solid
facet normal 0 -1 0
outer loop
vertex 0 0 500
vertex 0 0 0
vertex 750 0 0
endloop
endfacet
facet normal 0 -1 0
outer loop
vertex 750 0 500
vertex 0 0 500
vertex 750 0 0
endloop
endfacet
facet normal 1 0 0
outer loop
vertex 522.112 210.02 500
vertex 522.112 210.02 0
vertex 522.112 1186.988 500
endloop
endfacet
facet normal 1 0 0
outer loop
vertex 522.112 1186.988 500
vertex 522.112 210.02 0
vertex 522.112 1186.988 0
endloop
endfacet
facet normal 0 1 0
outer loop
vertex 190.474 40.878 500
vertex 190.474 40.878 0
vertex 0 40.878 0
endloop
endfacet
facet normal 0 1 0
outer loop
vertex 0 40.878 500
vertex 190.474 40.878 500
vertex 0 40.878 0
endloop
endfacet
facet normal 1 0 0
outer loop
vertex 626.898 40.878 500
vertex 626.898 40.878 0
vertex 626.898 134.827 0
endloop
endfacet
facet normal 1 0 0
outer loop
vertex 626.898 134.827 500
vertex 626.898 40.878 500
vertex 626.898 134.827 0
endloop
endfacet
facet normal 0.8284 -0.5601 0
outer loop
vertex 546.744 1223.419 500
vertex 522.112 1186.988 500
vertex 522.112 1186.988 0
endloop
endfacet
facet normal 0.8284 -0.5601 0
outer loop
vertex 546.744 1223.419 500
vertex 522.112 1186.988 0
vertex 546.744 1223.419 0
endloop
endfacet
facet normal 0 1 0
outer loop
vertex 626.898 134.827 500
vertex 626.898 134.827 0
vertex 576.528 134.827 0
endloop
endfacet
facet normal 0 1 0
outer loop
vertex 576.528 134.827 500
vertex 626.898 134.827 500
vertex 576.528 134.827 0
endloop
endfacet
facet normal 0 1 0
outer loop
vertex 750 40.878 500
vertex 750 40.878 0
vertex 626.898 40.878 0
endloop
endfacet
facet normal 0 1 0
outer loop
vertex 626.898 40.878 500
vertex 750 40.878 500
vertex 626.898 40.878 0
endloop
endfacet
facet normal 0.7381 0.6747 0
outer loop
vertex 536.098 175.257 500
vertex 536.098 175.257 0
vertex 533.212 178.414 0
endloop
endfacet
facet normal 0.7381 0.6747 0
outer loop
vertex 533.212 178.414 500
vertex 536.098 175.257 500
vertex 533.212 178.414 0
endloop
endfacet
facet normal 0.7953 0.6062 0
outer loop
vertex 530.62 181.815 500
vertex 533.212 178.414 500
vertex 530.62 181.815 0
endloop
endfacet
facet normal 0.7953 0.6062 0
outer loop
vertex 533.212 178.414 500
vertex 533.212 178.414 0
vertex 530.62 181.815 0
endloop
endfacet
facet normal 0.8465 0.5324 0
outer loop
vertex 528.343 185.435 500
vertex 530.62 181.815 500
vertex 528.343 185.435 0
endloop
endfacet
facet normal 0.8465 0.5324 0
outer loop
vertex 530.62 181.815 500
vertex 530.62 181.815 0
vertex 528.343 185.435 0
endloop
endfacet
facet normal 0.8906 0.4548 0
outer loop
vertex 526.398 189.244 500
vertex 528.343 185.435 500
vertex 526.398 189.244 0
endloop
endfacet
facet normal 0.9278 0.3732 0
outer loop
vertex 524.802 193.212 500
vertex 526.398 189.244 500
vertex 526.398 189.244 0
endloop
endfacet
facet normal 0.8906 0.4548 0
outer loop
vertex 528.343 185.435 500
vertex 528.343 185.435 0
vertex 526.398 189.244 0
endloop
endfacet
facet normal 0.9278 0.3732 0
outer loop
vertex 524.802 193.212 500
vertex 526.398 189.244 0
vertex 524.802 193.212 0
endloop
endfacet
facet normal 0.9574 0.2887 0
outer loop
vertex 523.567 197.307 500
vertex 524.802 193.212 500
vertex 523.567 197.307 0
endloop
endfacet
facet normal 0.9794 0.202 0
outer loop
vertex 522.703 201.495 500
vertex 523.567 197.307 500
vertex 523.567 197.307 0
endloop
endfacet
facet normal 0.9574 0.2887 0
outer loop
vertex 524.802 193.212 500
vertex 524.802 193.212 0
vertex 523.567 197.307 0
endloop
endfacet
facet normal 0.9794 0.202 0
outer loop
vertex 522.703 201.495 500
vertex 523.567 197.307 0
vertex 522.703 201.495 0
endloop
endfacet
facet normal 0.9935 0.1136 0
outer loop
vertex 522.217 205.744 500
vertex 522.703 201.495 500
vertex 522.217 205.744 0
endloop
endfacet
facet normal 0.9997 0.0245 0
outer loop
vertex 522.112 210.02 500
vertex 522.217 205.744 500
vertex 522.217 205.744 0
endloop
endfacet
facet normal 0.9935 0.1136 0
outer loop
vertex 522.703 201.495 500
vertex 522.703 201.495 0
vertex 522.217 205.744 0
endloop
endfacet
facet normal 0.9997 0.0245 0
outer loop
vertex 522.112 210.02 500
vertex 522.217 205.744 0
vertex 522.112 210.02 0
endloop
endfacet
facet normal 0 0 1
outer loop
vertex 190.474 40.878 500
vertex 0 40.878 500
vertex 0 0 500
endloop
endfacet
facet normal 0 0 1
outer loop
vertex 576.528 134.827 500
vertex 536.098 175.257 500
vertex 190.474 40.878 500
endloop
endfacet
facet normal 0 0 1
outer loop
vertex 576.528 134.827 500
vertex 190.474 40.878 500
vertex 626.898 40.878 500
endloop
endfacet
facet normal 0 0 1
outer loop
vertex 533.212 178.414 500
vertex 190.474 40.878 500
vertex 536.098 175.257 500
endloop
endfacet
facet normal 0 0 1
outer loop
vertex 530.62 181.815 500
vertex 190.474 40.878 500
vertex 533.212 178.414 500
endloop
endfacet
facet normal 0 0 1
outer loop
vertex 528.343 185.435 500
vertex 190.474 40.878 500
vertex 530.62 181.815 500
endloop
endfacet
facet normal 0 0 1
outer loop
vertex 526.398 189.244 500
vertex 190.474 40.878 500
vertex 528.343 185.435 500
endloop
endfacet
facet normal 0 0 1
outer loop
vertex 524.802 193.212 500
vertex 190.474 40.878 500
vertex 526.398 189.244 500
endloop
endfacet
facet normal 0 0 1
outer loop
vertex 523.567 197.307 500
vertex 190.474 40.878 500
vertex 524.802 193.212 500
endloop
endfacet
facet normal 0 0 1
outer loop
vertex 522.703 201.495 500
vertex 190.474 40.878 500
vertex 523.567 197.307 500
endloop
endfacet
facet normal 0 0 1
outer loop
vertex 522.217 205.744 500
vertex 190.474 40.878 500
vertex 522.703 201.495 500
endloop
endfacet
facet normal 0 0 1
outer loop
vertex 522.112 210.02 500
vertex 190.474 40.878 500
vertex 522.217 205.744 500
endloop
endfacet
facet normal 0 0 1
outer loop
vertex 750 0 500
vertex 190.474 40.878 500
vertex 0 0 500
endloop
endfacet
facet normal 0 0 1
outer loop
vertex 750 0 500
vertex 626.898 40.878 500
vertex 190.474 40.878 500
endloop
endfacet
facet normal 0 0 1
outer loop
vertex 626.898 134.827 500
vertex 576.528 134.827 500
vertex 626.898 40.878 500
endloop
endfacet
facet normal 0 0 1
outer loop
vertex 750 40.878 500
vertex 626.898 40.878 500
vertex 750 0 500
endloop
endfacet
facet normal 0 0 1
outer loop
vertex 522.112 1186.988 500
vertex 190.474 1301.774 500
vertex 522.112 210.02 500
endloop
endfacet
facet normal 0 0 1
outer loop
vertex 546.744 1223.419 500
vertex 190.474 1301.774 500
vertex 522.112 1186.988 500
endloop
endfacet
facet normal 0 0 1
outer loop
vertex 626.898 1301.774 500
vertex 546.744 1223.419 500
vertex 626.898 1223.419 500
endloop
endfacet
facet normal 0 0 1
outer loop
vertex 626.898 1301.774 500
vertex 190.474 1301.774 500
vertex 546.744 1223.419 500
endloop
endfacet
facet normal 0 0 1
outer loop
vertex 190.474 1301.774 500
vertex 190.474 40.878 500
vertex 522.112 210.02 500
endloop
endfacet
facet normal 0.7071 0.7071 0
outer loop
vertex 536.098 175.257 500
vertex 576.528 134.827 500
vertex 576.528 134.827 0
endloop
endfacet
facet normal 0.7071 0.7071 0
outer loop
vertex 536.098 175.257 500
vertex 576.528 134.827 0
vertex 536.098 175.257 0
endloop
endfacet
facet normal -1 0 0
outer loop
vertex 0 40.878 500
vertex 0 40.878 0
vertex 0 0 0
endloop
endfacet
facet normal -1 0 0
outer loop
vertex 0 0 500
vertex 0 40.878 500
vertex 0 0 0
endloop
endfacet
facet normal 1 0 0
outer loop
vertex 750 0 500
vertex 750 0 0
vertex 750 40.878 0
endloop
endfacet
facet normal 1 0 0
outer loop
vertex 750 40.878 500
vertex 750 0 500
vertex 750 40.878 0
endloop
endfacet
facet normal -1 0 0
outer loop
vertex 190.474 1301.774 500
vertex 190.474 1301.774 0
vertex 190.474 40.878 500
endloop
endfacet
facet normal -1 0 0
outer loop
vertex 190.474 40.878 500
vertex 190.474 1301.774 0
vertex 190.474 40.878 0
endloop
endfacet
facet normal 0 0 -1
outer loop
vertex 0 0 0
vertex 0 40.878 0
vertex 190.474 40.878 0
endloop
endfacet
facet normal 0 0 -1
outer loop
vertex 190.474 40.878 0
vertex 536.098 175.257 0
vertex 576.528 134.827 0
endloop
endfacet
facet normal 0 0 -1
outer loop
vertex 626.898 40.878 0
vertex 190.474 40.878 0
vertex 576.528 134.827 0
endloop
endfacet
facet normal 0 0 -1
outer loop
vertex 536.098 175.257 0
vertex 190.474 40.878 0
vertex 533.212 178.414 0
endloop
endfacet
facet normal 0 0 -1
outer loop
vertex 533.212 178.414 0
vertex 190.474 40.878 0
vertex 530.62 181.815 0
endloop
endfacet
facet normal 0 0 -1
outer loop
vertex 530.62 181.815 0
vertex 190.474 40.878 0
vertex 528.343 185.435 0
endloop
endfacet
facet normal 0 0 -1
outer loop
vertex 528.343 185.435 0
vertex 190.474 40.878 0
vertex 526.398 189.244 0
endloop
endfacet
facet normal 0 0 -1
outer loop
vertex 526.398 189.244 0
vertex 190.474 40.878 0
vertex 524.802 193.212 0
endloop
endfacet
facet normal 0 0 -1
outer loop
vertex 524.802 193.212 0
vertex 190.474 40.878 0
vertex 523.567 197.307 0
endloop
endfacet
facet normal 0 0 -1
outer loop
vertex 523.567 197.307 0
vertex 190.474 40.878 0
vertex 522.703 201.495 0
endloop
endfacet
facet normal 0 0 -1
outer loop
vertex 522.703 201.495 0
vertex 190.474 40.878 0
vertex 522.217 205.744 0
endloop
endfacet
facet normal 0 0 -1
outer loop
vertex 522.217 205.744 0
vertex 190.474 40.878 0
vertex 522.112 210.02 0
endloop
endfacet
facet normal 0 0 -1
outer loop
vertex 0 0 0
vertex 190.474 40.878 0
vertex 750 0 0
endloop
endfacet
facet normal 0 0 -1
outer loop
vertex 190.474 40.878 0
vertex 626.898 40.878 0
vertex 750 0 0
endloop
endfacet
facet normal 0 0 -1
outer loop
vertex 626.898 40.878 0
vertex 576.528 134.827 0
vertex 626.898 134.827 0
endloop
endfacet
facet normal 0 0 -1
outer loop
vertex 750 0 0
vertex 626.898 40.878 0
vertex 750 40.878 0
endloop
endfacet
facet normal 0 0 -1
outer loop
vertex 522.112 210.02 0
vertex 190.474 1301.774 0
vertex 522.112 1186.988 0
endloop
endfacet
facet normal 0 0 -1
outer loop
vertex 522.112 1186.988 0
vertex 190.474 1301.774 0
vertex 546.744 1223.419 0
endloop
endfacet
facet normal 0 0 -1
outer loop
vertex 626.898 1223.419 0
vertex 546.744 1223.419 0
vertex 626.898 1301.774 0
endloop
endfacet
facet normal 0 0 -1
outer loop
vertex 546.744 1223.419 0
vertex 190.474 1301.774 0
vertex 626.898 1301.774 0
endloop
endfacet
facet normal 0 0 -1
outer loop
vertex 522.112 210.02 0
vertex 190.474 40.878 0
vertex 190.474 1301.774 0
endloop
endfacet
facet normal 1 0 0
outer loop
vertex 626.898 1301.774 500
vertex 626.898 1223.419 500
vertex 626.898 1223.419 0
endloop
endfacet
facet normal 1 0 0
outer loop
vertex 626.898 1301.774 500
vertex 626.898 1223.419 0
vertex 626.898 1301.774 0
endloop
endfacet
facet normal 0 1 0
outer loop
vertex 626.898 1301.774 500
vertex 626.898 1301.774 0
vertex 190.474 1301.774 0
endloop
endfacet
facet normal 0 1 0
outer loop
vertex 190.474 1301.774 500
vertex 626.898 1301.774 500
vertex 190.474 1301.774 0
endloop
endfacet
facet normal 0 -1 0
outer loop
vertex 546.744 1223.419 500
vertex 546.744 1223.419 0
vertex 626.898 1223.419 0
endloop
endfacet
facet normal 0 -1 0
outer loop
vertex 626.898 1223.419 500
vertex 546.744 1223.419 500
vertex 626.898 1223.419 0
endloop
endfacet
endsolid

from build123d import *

# Parameters (mm, degrees)
SALIENTE_EXTRUIR3_DEPTH = 500


with BuildPart() as part:
    # Croquis1 → Saliente-Extruir3 (new body)
    with BuildSketch(Plane.XY):
        with BuildLine():
            Line((0, 40.878221652), (0, 0))
            Line((0, 0), (750, 0))
            Line((750, 0), (750, 40.878221652))
            Line((750, 40.878221652), (626.898052252, 40.878221652))
            Line((626.898052252, 40.878221652), (626.898052252, 134.827383306))
            Line((626.898052252, 134.827383306), (576.527963911, 134.827383306))
            Line((576.527963911, 134.827383306), (536.098133641, 175.257213576))
            ThreePointArc((536.098133641, 175.257213576), (525.555715427, 191.210340819), (522.112187733, 210.019566418))
            Line((522.112187733, 210.019566418), (522.112187733, 1186.988416459))
            Line((522.112187733, 1186.988416459), (546.74353007, 1223.418702419))
            Line((546.74353007, 1223.418702419), (626.898052252, 1223.418702419))
            Line((626.898052252, 1223.418702419), (626.898052252, 1301.77405161))
            Line((626.898052252, 1301.77405161), (190.474219634, 1301.77405161))
            Line((190.474219634, 1301.77405161), (190.474219634, 40.878221652))
            Line((190.474219634, 40.878221652), (0, 40.878221652))
        make_face()
    extrude(amount=SALIENTE_EXTRUIR3_DEPTH)


solid = part.part
